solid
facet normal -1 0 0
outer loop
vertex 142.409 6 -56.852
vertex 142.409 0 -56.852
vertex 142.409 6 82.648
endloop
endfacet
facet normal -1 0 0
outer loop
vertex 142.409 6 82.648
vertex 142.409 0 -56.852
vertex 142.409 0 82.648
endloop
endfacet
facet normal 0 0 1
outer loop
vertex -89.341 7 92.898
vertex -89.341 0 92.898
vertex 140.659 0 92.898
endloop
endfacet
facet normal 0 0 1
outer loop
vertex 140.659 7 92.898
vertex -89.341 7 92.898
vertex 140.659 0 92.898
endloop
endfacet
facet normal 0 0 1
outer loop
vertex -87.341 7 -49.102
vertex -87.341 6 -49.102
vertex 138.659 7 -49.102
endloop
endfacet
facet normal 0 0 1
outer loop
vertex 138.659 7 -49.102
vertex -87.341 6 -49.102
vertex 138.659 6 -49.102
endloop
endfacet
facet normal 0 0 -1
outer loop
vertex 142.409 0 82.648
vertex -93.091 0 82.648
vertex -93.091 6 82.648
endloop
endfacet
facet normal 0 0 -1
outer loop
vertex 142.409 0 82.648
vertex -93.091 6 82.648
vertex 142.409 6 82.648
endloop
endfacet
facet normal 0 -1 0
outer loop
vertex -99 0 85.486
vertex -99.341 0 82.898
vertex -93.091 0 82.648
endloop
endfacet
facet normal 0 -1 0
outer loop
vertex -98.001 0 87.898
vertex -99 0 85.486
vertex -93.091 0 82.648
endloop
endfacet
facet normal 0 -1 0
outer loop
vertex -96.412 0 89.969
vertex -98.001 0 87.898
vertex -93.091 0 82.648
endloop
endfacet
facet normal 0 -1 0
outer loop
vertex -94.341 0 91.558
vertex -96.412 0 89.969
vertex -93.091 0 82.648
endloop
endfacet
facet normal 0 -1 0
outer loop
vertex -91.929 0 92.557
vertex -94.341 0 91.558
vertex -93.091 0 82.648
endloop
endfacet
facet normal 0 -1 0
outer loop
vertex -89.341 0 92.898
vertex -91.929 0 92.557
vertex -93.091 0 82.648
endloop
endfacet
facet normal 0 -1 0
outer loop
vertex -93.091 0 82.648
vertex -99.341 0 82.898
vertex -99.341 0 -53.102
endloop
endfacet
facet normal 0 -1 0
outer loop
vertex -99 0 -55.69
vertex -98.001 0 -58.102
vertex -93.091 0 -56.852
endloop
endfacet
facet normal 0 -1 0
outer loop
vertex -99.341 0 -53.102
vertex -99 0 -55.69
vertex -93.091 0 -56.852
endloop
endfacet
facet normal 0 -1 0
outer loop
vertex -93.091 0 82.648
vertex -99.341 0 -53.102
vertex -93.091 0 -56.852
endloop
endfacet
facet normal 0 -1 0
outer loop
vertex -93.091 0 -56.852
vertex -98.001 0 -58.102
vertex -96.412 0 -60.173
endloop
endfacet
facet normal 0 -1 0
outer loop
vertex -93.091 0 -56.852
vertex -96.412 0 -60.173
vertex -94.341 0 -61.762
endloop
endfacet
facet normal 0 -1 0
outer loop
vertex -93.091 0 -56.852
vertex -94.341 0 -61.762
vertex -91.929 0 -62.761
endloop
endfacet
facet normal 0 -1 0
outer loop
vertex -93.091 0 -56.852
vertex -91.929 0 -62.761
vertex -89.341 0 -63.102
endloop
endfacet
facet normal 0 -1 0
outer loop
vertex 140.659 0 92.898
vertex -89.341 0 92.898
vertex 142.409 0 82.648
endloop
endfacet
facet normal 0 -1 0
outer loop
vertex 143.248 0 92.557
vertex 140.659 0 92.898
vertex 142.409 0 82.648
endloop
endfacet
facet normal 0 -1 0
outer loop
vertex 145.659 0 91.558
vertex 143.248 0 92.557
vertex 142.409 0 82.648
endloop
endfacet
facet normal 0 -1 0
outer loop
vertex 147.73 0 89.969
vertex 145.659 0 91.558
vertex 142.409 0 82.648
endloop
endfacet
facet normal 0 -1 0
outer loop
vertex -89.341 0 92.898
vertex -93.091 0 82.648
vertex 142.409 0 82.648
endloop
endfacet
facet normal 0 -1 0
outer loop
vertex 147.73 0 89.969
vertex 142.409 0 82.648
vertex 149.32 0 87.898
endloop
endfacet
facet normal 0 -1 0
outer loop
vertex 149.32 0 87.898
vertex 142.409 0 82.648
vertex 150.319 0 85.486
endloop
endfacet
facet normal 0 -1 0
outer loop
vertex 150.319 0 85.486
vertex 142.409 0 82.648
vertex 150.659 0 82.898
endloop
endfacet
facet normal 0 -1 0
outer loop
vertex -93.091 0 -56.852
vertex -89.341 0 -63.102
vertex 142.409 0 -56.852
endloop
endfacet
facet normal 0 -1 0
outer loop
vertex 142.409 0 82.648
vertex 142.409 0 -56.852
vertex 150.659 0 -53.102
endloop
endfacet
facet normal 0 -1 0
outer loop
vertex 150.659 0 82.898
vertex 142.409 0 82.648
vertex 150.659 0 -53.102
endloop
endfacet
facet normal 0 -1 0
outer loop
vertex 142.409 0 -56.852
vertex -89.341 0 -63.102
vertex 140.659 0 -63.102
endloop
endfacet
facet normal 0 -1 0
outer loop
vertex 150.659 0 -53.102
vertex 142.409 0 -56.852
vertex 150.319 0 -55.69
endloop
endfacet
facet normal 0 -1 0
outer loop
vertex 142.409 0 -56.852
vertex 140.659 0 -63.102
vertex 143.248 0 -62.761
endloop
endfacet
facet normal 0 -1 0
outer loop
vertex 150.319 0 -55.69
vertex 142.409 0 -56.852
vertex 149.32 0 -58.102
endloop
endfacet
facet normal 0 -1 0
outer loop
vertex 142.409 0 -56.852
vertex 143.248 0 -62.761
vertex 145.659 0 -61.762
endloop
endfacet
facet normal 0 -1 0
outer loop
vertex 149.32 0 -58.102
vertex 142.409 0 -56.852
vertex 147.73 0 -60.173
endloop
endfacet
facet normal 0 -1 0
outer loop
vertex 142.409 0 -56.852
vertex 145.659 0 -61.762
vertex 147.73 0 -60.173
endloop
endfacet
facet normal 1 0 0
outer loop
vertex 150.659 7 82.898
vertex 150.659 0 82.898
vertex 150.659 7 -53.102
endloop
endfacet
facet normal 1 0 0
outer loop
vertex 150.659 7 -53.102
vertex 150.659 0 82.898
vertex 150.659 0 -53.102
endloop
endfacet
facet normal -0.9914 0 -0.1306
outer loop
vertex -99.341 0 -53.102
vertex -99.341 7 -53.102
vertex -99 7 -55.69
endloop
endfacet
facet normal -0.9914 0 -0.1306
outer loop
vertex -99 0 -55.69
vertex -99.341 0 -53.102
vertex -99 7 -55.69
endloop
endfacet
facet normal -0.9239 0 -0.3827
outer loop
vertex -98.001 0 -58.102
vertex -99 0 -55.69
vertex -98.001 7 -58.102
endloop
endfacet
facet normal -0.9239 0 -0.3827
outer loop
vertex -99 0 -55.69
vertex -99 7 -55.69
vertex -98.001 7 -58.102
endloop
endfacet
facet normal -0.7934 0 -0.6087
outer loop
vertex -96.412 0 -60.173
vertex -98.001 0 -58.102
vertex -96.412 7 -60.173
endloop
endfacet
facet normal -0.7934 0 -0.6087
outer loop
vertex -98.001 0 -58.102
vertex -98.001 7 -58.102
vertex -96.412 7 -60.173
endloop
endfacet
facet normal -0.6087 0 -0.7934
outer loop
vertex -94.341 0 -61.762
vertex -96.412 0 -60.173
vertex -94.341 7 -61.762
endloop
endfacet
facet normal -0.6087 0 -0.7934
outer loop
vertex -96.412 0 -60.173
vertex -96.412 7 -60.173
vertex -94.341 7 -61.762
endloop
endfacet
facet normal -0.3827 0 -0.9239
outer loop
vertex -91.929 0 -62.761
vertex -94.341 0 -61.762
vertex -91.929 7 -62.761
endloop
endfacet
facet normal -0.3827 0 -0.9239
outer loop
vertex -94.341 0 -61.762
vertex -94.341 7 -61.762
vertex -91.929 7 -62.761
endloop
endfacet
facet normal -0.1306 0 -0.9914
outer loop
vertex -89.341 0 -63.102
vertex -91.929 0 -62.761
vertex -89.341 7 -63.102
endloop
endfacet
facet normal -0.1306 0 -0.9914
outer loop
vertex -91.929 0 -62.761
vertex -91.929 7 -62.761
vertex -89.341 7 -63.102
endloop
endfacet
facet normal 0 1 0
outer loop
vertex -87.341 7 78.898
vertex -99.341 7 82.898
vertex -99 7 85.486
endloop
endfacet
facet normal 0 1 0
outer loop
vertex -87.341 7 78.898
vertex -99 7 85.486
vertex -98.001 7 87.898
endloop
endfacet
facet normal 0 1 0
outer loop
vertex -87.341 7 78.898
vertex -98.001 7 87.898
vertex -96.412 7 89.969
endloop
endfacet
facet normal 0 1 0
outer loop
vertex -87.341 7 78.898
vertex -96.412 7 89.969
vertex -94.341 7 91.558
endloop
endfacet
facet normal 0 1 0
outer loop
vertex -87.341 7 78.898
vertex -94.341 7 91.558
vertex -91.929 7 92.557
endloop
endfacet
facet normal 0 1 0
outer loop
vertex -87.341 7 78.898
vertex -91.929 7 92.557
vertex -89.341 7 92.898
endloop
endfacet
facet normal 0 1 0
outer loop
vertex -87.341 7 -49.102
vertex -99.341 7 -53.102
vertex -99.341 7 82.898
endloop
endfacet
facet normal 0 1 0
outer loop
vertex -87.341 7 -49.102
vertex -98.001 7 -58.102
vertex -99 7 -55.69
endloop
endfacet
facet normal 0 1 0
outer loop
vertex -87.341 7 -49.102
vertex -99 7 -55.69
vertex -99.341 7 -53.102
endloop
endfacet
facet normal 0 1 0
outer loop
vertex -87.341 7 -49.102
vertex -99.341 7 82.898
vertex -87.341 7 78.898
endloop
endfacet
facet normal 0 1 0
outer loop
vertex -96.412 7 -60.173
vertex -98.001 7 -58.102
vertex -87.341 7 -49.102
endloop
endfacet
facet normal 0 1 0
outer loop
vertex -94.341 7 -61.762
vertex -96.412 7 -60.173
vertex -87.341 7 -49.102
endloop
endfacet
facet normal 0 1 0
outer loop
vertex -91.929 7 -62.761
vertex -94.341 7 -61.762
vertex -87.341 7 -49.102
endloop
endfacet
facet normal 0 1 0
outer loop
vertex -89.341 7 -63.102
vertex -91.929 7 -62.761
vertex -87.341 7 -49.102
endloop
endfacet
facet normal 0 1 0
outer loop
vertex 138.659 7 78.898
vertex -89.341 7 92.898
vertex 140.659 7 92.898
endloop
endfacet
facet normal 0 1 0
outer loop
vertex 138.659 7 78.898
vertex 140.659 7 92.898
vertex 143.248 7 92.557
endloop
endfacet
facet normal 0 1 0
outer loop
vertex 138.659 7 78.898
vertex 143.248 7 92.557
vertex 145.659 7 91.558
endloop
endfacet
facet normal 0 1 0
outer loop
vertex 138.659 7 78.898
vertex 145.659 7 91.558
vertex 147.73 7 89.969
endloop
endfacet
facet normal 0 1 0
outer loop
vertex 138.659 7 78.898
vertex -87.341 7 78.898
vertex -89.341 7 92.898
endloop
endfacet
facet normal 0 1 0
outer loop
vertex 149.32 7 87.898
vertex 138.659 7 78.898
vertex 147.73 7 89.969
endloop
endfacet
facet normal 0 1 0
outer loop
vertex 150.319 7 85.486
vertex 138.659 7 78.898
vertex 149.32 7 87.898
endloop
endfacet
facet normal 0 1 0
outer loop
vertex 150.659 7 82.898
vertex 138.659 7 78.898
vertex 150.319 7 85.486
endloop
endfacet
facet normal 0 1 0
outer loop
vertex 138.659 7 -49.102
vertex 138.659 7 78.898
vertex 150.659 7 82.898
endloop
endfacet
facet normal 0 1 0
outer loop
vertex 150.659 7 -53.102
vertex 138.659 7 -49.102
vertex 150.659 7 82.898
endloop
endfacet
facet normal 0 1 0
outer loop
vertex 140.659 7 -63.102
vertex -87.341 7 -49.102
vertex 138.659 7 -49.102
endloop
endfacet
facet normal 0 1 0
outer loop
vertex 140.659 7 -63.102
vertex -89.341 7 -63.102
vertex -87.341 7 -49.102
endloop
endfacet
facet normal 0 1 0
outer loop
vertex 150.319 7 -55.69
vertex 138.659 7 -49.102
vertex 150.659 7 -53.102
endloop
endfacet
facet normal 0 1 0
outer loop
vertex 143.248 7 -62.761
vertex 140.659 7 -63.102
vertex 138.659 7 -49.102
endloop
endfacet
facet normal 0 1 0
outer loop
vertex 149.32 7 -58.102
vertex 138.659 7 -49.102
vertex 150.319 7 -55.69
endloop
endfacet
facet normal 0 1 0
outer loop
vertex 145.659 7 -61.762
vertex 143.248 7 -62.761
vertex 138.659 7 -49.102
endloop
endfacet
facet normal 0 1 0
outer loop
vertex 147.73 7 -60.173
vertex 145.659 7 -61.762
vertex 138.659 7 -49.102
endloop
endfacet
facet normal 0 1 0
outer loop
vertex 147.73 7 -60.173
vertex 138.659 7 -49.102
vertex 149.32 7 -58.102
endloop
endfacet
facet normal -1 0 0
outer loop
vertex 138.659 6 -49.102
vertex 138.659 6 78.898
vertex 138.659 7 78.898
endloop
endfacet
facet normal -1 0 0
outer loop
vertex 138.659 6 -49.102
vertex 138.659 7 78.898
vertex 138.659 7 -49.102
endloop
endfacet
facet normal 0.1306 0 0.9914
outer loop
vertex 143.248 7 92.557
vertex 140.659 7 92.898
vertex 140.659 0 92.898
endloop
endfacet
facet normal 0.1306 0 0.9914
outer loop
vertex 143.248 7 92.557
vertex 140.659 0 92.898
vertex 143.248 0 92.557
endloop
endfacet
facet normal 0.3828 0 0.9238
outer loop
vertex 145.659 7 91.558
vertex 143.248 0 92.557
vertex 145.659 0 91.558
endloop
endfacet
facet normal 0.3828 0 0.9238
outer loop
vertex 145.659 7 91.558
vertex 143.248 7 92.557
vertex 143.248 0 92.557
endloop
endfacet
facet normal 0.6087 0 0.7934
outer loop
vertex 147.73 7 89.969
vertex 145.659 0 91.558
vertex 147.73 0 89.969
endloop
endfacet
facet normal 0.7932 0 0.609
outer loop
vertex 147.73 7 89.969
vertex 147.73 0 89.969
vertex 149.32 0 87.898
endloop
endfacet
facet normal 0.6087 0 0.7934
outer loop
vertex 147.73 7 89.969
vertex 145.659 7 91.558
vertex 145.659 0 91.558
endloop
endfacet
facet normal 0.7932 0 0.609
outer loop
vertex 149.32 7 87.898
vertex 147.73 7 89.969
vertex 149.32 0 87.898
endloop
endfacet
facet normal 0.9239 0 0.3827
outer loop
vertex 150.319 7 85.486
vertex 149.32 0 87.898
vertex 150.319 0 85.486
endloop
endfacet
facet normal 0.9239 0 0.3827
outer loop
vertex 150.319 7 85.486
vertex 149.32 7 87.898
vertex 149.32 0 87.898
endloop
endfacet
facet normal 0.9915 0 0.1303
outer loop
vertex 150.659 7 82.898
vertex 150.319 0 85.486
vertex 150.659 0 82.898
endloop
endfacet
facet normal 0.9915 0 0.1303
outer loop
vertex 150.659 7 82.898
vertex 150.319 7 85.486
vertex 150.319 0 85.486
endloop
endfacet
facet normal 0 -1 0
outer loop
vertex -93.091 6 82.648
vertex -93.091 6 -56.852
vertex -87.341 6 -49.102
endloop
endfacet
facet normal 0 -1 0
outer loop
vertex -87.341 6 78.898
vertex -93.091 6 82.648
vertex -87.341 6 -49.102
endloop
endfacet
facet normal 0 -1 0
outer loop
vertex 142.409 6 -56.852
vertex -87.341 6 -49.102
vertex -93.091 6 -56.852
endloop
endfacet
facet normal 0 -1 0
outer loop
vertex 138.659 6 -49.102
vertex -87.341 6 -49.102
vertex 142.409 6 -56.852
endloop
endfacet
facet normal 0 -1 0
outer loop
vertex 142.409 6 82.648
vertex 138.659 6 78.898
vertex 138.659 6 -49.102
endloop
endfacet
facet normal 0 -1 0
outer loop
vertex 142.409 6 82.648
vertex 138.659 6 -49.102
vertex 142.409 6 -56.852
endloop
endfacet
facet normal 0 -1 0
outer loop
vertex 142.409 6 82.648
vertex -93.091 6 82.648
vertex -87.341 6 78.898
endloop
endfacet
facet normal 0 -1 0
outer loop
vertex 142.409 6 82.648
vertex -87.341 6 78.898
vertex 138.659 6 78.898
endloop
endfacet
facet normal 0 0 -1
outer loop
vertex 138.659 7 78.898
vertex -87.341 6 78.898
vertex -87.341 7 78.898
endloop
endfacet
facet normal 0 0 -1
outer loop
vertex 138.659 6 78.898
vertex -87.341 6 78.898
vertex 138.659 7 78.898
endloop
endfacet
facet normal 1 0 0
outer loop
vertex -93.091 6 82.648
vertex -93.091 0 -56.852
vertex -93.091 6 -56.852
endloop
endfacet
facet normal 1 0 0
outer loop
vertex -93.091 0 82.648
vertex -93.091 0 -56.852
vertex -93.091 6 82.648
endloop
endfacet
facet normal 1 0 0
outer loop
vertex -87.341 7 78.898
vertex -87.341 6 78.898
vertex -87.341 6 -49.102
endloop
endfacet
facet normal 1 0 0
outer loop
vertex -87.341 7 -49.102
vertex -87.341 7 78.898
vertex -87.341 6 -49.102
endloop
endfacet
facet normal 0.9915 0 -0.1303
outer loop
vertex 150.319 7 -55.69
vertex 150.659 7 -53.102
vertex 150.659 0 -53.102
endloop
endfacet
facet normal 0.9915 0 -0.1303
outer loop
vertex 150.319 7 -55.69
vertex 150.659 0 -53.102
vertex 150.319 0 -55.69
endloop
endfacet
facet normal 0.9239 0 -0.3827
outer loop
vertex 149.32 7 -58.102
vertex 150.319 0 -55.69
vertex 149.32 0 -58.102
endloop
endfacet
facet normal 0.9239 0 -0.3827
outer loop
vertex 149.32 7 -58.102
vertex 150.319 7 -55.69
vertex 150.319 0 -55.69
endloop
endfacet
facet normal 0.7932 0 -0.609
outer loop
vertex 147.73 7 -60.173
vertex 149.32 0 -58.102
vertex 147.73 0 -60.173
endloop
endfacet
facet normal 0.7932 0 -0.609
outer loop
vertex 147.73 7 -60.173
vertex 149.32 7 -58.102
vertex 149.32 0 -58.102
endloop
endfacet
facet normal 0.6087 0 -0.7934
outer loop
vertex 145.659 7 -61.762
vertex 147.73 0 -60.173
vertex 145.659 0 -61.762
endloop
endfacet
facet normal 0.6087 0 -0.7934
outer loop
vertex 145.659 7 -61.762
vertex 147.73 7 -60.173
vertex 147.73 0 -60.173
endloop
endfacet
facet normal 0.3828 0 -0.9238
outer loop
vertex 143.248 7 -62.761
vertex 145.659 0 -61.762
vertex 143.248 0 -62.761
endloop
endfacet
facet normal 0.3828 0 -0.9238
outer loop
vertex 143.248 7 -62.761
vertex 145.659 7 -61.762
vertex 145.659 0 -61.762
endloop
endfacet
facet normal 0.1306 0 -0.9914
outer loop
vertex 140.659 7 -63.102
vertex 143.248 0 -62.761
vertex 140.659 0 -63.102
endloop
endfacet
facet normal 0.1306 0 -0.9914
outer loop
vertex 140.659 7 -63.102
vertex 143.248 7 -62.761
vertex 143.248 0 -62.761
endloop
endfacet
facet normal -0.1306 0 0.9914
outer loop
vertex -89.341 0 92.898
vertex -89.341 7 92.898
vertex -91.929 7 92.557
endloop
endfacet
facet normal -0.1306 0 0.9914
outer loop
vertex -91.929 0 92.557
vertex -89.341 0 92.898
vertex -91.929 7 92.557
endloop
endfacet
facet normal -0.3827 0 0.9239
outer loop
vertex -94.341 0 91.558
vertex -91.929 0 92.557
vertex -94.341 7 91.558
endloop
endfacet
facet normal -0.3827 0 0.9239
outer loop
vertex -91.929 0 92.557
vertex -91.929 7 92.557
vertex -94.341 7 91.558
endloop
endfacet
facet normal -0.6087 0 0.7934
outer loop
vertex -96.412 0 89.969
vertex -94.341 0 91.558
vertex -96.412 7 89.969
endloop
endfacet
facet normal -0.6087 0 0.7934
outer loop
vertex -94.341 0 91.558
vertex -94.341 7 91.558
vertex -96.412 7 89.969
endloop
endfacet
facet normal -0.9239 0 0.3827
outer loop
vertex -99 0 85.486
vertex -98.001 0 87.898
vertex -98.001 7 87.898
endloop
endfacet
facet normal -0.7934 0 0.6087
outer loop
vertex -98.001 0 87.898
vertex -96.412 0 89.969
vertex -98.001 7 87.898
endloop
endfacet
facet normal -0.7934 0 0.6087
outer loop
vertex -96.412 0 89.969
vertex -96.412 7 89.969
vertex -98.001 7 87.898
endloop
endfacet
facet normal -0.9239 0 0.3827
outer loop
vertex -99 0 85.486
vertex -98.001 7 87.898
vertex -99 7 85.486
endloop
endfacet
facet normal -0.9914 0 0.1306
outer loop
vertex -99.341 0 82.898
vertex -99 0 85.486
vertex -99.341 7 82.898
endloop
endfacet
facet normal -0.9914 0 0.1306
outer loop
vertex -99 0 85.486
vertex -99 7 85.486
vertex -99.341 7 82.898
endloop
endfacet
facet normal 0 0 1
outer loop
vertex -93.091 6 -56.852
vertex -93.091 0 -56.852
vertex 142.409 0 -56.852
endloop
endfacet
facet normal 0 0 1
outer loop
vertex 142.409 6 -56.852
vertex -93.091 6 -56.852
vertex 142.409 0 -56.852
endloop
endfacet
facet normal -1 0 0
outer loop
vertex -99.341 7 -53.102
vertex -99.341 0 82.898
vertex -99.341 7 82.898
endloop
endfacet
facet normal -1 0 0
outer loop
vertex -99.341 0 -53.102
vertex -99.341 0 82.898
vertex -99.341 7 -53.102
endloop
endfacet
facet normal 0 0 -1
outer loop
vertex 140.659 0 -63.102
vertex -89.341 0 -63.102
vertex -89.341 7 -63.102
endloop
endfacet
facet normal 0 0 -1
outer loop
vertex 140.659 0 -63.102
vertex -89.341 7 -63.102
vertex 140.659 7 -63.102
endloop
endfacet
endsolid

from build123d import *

# Parameters (mm, degrees)
SKETCH_1_W          = 250
SKETCH_1_H          = 156
SKETCH_1_W_2        = 226
SKETCH_1_H_2        = 128
EXTRUDE_1_DEPTH     = 8
SKETCH_2_W          = 235.5
SKETCH_2_H          = 139.5
CUT_EXTRUDE_3_DEPTH = 6
CUT_EXTRUDE_4_DEPTH = 10
CUT_EXTRUDE_5_DEPTH = 10
SKETCH_6_W          = 250
SKETCH_6_H          = 156
CUT_EXTRUDE_6_DEPTH = 1


with BuildPart() as part:
    # 草图1 → 凸台-拉伸1 (new body)
    with BuildSketch(Plane(origin=(0, 0, 0), x_dir=(1, 0, 0), z_dir=(0, 1, 0))):
        with Locations((25.659327926, -14.898030127)):
            Rectangle(SKETCH_1_W, SKETCH_1_H)
        with Locations((25.659327926, -14.898030127)):
            Rectangle(SKETCH_1_W_2, SKETCH_1_H_2, mode=Mode.SUBTRACT)
    extrude(amount=EXTRUDE_1_DEPTH)

    # 草图2 → 切除-拉伸3 (cut)
    with BuildSketch(Plane.XZ):
        with Locations((24.659327926, 12.898030127)):
            Rectangle(SKETCH_2_W, SKETCH_2_H)
    extrude(amount=-CUT_EXTRUDE_3_DEPTH, mode=Mode.SUBTRACT)

    # 草图3 → 切除-拉伸4 (cut)
    with BuildSketch(Plane(origin=(0, 8, 0), x_dir=(1, 0, 0), z_dir=(0, 1, 0))):
        with BuildLine():
            Line((-89.340672074, 63.101969873), (-99.340672074, 63.101969873))
            Line((-99.340672074, 63.101969873), (-99.340672074, 53.101969873))
            ThreePointArc((-99.340672074, 53.101969873), (-96.411739886, 60.173037684), (-89.340672074, 63.101969873))
        make_face()
    extrude(amount=-CUT_EXTRUDE_4_DEPTH, mode=Mode.SUBTRACT)

    # 草图4 → 切除-拉伸5 (cut)
    with BuildSketch(Plane(origin=(0, 8, 0), x_dir=(1, 0, 0), z_dir=(0, 1, 0))):
        with BuildLine():
            Line((-99.340672074, -82.898030127), (-99.340672074, -92.898030127))
            Line((-99.340672074, -92.898030127), (-89.340672074, -92.898030127))
            ThreePointArc((-89.340672074, -92.898030127), (-96.411739886, -89.969097939), (-99.340672074, -82.898030127))
        make_face()
        with BuildLine():
            Line((150.659327926, -82.898030127), (150.659327926, -92.898030127))
            Line((150.659327926, -92.898030127), (140.659327926, -92.898030127))
            ThreePointArc((140.659327926, -92.898030127), (147.730395738, -89.969097939), (150.659327926, -82.898030127))
        make_face()
        with BuildLine():
            Line((140.659327926, 63.101969873), (150.659327926, 63.101969873))
            Line((150.659327926, 63.101969873), (150.659327926, 53.101969873))
            ThreePointArc((150.659327926, 53.101969873), (147.730395738, 60.173037684), (140.659327926, 63.101969873))
        make_face()
    extrude(amount=-CUT_EXTRUDE_5_DEPTH, mode=Mode.SUBTRACT)

    # 草图6 → 切除-拉伸6 (cut)
    with BuildSketch(Plane(origin=(0, 8, 0), x_dir=(1, 0, 0), z_dir=(0, 1, 0))):
        with Locations((25.659327926, -14.898030127)):
            Rectangle(SKETCH_6_W, SKETCH_6_H)
    extrude(amount=-CUT_EXTRUDE_6_DEPTH, mode=Mode.SUBTRACT)


solid = part.part
